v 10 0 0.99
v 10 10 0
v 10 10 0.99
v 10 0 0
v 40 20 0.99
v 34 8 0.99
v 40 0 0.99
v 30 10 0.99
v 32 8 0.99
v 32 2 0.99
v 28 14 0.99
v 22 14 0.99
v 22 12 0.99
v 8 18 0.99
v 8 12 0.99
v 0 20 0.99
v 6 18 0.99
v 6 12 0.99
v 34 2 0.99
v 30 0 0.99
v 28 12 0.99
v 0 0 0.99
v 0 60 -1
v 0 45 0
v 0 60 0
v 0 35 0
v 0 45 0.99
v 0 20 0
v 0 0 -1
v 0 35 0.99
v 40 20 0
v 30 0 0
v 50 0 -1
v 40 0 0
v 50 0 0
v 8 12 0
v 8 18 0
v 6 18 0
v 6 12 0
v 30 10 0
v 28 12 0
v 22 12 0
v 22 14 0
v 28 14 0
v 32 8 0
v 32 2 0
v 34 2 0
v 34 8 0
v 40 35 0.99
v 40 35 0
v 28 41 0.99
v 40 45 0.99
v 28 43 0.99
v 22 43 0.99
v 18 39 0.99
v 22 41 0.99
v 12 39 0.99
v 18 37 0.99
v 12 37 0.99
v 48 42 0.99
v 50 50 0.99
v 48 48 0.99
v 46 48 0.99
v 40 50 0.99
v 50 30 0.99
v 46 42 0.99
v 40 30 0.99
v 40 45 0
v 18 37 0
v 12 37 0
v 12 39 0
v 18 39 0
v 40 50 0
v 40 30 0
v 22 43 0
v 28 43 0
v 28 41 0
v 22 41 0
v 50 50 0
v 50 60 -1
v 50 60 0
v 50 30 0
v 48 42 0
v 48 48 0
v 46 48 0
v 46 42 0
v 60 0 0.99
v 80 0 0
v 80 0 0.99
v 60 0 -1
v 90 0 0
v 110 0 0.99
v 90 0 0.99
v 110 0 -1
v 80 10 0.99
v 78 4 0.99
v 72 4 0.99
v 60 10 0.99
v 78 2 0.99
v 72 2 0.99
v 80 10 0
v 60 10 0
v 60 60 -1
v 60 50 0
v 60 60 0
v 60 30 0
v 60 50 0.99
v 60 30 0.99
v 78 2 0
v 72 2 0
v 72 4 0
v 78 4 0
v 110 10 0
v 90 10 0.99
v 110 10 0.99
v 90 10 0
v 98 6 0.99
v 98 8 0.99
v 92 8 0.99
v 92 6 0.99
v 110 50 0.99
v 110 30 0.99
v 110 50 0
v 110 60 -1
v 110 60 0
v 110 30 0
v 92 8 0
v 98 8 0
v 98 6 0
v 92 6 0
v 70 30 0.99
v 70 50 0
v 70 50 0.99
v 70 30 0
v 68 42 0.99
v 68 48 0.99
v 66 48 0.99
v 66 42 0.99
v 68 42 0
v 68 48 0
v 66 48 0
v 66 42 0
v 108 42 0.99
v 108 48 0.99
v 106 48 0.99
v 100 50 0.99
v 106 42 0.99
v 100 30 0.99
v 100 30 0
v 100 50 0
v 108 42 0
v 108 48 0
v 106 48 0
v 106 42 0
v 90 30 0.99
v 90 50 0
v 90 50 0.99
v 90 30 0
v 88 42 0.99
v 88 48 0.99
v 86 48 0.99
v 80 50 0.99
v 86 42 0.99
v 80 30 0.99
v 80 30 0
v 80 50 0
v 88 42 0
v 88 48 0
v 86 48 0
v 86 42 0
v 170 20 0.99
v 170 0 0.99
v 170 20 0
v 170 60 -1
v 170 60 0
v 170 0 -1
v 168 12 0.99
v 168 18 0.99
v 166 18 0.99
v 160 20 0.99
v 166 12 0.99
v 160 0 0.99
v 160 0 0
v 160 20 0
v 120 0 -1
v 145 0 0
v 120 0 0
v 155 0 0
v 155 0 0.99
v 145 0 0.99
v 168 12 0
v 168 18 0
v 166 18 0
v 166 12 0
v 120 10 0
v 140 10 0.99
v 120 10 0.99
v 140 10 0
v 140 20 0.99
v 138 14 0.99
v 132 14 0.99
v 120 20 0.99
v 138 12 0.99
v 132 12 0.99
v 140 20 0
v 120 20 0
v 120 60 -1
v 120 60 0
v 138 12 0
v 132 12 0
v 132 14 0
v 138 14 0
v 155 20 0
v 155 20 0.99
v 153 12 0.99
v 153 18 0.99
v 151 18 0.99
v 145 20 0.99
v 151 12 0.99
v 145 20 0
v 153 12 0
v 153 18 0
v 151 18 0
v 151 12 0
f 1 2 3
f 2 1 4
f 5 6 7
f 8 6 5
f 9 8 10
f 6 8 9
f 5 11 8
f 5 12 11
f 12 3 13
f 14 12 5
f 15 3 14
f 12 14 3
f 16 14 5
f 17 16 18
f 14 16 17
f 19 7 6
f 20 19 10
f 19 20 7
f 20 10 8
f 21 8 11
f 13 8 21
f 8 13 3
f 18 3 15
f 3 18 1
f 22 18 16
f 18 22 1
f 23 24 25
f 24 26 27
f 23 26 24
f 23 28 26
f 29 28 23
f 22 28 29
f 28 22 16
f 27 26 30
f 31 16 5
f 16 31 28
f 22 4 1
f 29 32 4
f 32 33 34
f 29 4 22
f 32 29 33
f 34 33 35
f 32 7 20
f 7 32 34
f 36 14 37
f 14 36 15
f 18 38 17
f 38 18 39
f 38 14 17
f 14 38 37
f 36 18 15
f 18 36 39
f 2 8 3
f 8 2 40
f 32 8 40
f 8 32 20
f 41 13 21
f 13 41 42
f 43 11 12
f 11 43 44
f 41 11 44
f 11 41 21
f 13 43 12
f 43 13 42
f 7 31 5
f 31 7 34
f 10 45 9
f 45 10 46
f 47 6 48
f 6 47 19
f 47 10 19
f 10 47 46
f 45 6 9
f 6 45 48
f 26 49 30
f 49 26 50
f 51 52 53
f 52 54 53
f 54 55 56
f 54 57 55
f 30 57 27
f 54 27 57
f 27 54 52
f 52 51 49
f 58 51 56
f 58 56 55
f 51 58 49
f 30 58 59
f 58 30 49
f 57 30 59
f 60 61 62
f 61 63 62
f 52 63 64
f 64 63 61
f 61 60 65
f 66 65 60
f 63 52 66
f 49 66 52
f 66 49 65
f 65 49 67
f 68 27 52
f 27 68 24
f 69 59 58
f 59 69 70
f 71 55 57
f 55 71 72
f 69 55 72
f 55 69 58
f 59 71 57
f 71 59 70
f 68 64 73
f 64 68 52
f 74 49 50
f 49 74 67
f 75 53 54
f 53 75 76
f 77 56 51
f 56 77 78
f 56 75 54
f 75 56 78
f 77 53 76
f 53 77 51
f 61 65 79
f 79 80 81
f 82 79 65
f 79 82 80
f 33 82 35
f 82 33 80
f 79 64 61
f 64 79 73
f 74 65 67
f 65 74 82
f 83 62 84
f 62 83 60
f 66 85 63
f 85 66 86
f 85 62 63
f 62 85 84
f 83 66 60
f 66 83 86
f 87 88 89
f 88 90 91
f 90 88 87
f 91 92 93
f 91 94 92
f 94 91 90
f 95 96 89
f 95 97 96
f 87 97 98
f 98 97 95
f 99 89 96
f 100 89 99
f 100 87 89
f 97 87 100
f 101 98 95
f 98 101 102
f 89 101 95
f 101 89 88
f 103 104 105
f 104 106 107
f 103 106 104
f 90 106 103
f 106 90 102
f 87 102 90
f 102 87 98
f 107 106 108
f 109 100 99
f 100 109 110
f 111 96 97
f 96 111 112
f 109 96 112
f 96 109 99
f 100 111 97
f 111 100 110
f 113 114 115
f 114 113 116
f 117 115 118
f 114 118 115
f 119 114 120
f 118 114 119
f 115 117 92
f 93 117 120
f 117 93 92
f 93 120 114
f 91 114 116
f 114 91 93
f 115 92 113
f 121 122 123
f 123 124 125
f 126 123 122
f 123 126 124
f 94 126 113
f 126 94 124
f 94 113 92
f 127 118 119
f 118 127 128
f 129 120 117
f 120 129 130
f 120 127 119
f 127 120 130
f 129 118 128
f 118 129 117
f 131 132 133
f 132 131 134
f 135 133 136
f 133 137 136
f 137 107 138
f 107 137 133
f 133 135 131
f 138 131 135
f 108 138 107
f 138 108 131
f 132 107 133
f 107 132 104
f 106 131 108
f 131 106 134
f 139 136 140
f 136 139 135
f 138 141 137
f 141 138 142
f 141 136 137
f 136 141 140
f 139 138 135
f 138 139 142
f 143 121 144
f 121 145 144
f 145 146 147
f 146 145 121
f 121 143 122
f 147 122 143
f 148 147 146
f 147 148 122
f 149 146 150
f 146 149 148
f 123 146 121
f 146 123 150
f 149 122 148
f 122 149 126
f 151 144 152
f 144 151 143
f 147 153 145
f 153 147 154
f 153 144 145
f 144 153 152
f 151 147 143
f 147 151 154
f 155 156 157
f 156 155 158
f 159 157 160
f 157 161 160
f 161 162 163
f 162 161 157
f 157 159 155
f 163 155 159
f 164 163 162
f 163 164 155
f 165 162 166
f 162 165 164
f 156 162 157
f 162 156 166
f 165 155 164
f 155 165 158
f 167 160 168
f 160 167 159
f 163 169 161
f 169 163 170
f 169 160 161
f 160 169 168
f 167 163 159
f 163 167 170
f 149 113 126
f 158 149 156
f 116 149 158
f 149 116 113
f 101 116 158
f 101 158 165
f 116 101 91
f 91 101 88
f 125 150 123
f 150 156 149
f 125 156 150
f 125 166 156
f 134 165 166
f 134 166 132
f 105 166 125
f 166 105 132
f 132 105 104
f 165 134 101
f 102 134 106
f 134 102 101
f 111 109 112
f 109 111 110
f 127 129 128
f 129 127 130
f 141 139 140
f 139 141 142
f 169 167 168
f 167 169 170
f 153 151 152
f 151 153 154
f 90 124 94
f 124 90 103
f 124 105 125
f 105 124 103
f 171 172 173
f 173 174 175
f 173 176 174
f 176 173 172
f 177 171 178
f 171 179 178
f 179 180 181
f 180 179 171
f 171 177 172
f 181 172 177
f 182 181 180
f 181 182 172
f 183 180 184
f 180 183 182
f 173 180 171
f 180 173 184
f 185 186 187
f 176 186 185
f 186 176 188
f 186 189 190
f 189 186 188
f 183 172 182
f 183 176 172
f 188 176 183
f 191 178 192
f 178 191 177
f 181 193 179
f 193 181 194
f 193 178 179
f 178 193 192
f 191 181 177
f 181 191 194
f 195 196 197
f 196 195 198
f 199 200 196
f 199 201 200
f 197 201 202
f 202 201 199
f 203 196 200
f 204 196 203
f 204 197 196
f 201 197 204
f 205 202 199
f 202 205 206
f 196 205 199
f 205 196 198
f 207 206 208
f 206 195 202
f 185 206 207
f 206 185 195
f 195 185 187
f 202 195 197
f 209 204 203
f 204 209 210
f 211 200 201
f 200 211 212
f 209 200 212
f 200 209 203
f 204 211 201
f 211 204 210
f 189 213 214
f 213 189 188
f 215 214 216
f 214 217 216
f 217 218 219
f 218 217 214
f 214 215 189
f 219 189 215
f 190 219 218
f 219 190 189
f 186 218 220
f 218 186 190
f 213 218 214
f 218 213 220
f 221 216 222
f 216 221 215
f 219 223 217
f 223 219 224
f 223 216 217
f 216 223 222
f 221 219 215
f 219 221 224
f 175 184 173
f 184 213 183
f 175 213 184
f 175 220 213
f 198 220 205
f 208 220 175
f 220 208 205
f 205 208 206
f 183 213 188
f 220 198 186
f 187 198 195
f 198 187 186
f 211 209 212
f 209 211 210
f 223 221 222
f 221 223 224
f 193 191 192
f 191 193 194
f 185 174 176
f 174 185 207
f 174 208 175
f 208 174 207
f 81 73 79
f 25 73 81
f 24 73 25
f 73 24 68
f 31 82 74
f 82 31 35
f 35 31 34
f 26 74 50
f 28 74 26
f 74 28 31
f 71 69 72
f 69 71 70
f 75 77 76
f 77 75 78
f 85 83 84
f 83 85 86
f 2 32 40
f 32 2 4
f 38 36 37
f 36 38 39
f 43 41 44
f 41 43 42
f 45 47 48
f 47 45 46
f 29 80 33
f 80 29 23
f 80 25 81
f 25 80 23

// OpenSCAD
// file: ../../Base/Boxes.scad
// Fischertechnik Box Foundation
// Pre-designed Boxes

use <Constants.scad>

include <PlacementOptions.scad>

box190Width = 190;
box190Depth = 130;
box130Width = 130;
box130Depth = 95;

// Values are from an original ec3 box
topBottomDifference = 1.5;
outerHeight = 40;
innerHeight = 38.2;
baseThickness = outerHeight - innerHeight;
stackExcess = 5.7;
radius = 3.5;
wallThickness = 1.5;
tolerance = 0.2;
stackOffset = innerHeight - stackExcess;

boxUsageHeight = stackOffset;
boxWallThickness = wallThickness;
boxBaseThickness = baseThickness;
boxWebWidth = 3.0;

// getBoxWallThickness()
// Gets the wall thickness of a Fischertechnik Box
function getBoxWallThickness() = boxWallThickness;

// getBoxUsageHeight()
// Gets the usable height of a Fischertechnik box
function getBoxUsageHeight() = boxUsageHeight;

// getBoxInnerHeight()
// Gets the inner height of a Fischertechnik box, including the stack excess
function getBoxInnerHeight() = innerHeight;

// getBoxBaseThickness()
// Gets the thickness of the Fischertechnik box base.
function getBoxBaseThickness() = boxBaseThickness;

// getBoxWebWidth()
// Gets the width of a box web
function getBoxWebWidth() = boxWebWidth;

// getBox190Space()
// Gets the usable inner space of a Box 190 as an x/y-list
function getBox190Space() = [
    box190Width - 2*getBoxWallThickness() - topBottomDifference, 
    box190Depth - 2*getBoxWallThickness() - topBottomDifference ];

// BoxBase(width, depth)
// Creates an empty stackable Fischertechnik compatible box
// width = Outer width of the box (190, 130, ...)
// depth = Outer depth of the box (130, 95, ...)

module BoxBase(width, depth, height=outerHeight) {    
    thinPlate = 0.01;

    innerHeight = height - baseThickness;    
    
    module BodyPlate(width, depth) {
        translate([radius, radius])
        hull() {
            w = width-2*radius;
            d = depth-2*radius;
            cube([w, d, thinPlate]);
            cylinder(thinPlate, r=radius, $fn=getFragments());
            translate([w, 0])
                cylinder(thinPlate, r=radius, $fn=getFragments());
            translate([w, d])
                cylinder(thinPlate, r=radius, $fn=getFragments());
            translate([0, d])
                cylinder(thinPlate, r=radius, $fn=getFragments());
        }
    }
    
    module Body(tolerance=tolerance) {
        hull() {
            // Bottom with tolerance to fit into the original boxes when stacked
            translate([-wallThickness+tolerance, -wallThickness+tolerance, -baseThickness])
                BodyPlate(width-topBottomDifference-2*tolerance, depth-topBottomDifference-2*tolerance);
            
            // Top
            translate([-wallThickness-topBottomDifference/2, -wallThickness-topBottomDifference/2, innerHeight-thinPlate])
                BodyPlate(width, depth);
         }
    }

    module Cutoff() {
        hull() {
            coWidth = width - 2*wallThickness;
            coDepth = depth - 2*wallThickness;
            
            // Bottom
            BodyPlate(coWidth-topBottomDifference, coDepth-topBottomDifference);

            // Top
            translate([-topBottomDifference/2, -topBottomDifference/2, innerHeight+thinPlate]) 
                BodyPlate(coWidth, coDepth);
        }
    }
    
    difference() {        
        Body();
        Cutoff();
        stackOffset = innerHeight - stackExcess;
        translate([0, 0, stackOffset + baseThickness])
            Body(tolerance=0);
    }
}

// Creates the Fischertechnik empty box 130x190 mm and places it at position 0,0
// 190x130 are the outer sizes, the inner space is slightly smaller. Use getBox190Space() to get the inner sizes.
// The box is positioned that the usable inner space is at the 0,0,0 position. The

module Box190() {
    BoxBase(box190Width, box190Depth);
}

// Gets the usable inner space of a Box 130 as an x/y-list
function getBox130Space() = [
    box130Width - 2*getBoxWallThickness(), 
    box130Depth - 2*getBoxWallThickness() ];

// Creates the Fischertechnik empty box 95x130 mm and places it at position 0,0
// 190x130 are the outer sizes, the inner space is slightly smaller. Use getBox190Space() to get the inner sizes.
// The box is positioned that the usable inner space is at the 0,0,0 position. The

module Box130() {
    BoxBase(box130Width, box130Depth);
}

// Creates a web at the specified box walls
// corner 0 = LowerLeft, 1 = UpperLeft, 2 = UpperRight, 3 = LowerRight
// side 0 = LeftOfCorner, 1 = RightOfCorner
// distance = Distance in mm from the corner
// boxSpace = inner width and depth of the box (default: Box 190)
// webWidth = length of the web (default is 3 mms)
// webThickness = thickness of the web (default is 1 mm)

module BoxWeb(corner, side, distance, boxSpace=getBox190Space(), webWidth=getBoxWebWidth(), webThickness=1.0) {
    sink = getBoxWallThickness()/2;

    width = (corner % 2 == 0) ? 
            (side == LeftOfCorner ? webWidth : webThickness) :
            (side == LeftOfCorner ? webThickness : webWidth);

    depth = (corner % 2 == 0) ? 
            (side == RightOfCorner ? webWidth : webThickness) :
            (side == RightOfCorner ? webThickness : webWidth);
    
    xDiff = corner == LowerLeft ? 
                (side == LeftOfCorner ? -sink : distance) :
            (corner == UpperLeft ?                
                (side == LeftOfCorner ? distance : -sink) :
            (corner == UpperRight ?
                (side == LeftOfCorner ? boxSpace.x-webWidth+sink : boxSpace.x-distance-webThickness) :
                (side == LeftOfCorner ? boxSpace.x-distance-webThickness: boxSpace.x-webWidth+sink)));

    yDiff = corner == LowerLeft ? 
                (side == RightOfCorner ? -sink : distance) :
            (corner == UpperLeft ?
                (side == RightOfCorner ? boxSpace.y-distance : boxSpace.y-webWidth+sink) :
            (corner == UpperRight ?
                (side == RightOfCorner ? boxSpace.y-webWidth+sink : boxSpace.y-distance) :
                (side == RightOfCorner ? distance : -sink)));
    
    translate([xDiff, yDiff, -getExcess()])
        cube([width, depth, boxUsageHeight + 2*getExcess()]);
}
// file: ../../Base/Alignment.scad
// Fischertechnik Box Foundation
// Geometry Helpers Alignment

include <PlacementOptions.scad>

// getAlignedX(elementWidth, spaceWidth, align=AlignRight, offset=0)
// Gets the aligned X offset of an element with the given
// width in the given space.
// elementWidth = The width of the element to positon
// spaceWidth = The space where the element should be aligned
// align = 0 AlignLeft, 1 AlignCenter, 2 AlignRight
// offset = an optional offset from the aligned position. When
// aligned left or centered, then positive values are in X direction.
// When aligned right then positive values are in negative X direction.

function getAlignedX(elementWidth, spaceWidth, align=AlignRight, offset=0) =
    (align == AlignLeft) ?
        offset :
        ((align == AlignCenter) ?
        (spaceWidth - elementWidth)/2 + offset :
        spaceWidth - offset - elementWidth);

// getAlignedY(elementDepth, spaceDepth, align=AlignTop, offset=0)
// Gets the aligned Y offset of an element with the given
// depth in the given space.
// elementDepth = The depth of the element to positon
// spaceDepth = The space where the element should be aligned
// align = 0 AlignBottom, 1 AlignCenter, 2 AlignTop
// offset = an optional offset from the aligned position. When
// aligned bottom or centered, then positive values are in Y direction.
// When aligned top then positive values are in negative Y direction.

function getAlignedY(elementDepth, spaceDepth, align=AlignTop, offset=0) =
    (align == AlignBottom) ?
        offset :
        ((align == AlignCenter) ?
        (spaceDepth - elementDepth)/2 + offset :
        spaceDepth - offset - elementDepth);
// file: ../../Base/Rotation.scad
// Fischertechnik Box Foundation
// Geometry Helpers Rotation

include <PlacementOptions.scad>

// getRotatedSpace(space, rotation=NoRotation)
// Rotates the space dependent on the specified rotation

function getRotatedSpace(space, rotation=NoRotation) = [
    (rotation == Rotate90 || rotation == Rotate270) ? space.y : space.x,
    (rotation == Rotate90 || rotation == Rotate270) ? space.x : space.y
];

// Rotates the given space around the fixed left lower corner
// space = the space the children needs as width/depth list [width,depth]
// rotation = 0 Rotate0 degrees, 1 Rotate90 degrees, 2 Rotate180 degrees, 3 Rotate270 degrees (equivalent to -90)

module RotateFix(space, rotation=NoRotation) {
    dy = (rotation == Rotate0 || rotation == Rotate270) ? 0 :
        (rotation == Rotate90) ? space.x :
        space.y;
    dx = (rotation < Rotate180) ? 0 :
        (rotation == Rotate180) ? space.x :
        space.y;
    
    translate([dx, dy, 0])
        rotate([0, 0, rotations[rotation]])
            children();
}
// file: ../../Base/Helper.scad
// Fischertechnik Box Foundation
// Helper functions

include <PlacementOptions.scad>

// getRotation(rotations, i)
// gets the rotation with index i, even if rotations or rotations[i] is undefined.
// If undefined, NoRotation ist returned.
// rotations = list of Rotate-constants
// i = Index of the rotation
function getRotation(rotations, i) = (is_undef(rotations) || is_undef(rotations[i])) ? NoRotation : rotations[i];
// file: ../../Base/Constants.scad
// Fischertechnik Box Foundation
// Constants

// Constant values necessary for multiple elements

// Base constants
dividerThickness = 1.2;
excess = 0.01;
fragments = 90;
tolerance = 0.8;

// Gets the thickness of a divider 
function getDividerThickness() = dividerThickness;

// Gets the excess that is used to merge walls into each other
function getExcess() = excess;

// Gets amount of fragments of a cylinder
function getFragments() = fragments;

// Gets the inner tolerance of a frame to each side
function getTolerance() = tolerance;


// Fischertechnik specific constants
axisDiameter = 4;
axisBottomDiameter = axisDiameter + 1;
standardEdgeDistance = 2.5;
standardWebDistance = 11.5;
standardCornerLength = 15;
tubeWallFactor = 0.8;
smallPartsFrameHeight = 20;

// Gets axis diameter
function getAxisDiameter() = axisDiameter;

// Gets axis bottom diameter for thicker part at the bottom
function getAxisBottomDiameter() = axisBottomDiameter;

// gets the standard distance to the wall of the box for dockable frames with webs
function getStandardEdgeDistance() = standardEdgeDistance;

// gets the standard distance of each web to the corner of the dockable frame
function getStandardWebDistance() = standardWebDistance;

// gets the standard length of the corner walls of a dockable frame
function getStandardCornerLength() = standardCornerLength;

// gets the wall thickness of a tube.
function getTubeWallThickness() = tubeWallFactor * getDividerThickness();

// gets the frame height for docked small parts boxes.
function getSmallPartsFrameHeight() = smallPartsFrameHeight;
// file: ../TestHelper.scad
// Fischertechnik Box Foundation
// Test Helper

function getPlacementBaseSpace() = [50,60];
function getCubeSpace() = [10,20];

module PlacementBase() {
    color("green")
    translate([0, 0, -1])
        cube([getPlacementBaseSpace().x, getPlacementBaseSpace().y, 1]);
}

module Cube() {
    translate([0,0,-.01])
    difference() {
        cube([getCubeSpace().x,getCubeSpace().y,1]);
        translate([getCubeSpace().x*0.6, getCubeSpace().y*0.6, -1])
            cube([getCubeSpace().x*0.2,getCubeSpace().y*0.3,3]);
    }
}

module Deploy(distance=30) {
    for( i = [0:1:$children-1])
        translate([i*distance, 0])
            children(i);
}
// file: ../../Base/PlacementOptions.scad
// Fischertechnik Box Foundation
// Placement Options

// Alignment
NoAlign = 0;
AlignLeft = 1;
AlignBottom = 2;
AlignCenter = 3;
AlignRight = 4;
AlignTop = 5;

// Element rotation degree steps
rotations = [0, -90, -180, -270];

// Rotation
NoRotation = 0;
Rotate0 = 0;
Rotate90 = 1;
Rotate180 = 2;
Rotate270 = 3;

// Docking (seen from above)
NoDock = -1;
DockLeft = 0;
DockTop = 1;
DockRight = 2;
DockCorner = 2;
DockBottom = 3;

// Web corners
LowerLeft = 0;
UpperLeft = 1;
UpperRight = 2;
LowerRight = 3;

// Web position relative to corner
LeftOfCorner = 0;
RightOfCorner = 1;
// file: ../../Base/Placement.scad
// Fischertechnik Box Foundation
// Geometry Helpers Placement

use <Constants.scad>
use <Alignment.scad>
use <Rotation.scad>
use <Boxes.scad>

include <PlacementOptions.scad>

// Place(x=0, y=0, elementSpace=[0,0], alignX=AlignLeft, alignY=AlignBottom, rotation=Rotate0, boxSpace=getBox190Space())
// Places the child at the specified position
// y = Y-Position. This is a relative position when an X aligment is specified.
// x = X-Position. This is a relative position when an Y aligment is specified.
// elementSpace = space of the element to be placed [x,y]
// alignX = -1=NoAlign, 0 AlignLeft, 1 AlignCenter, 3 AlignRight (elementSpace and boxSpace required!)
// alignY = -1=NoAlign, 2 AlignBottom, 1 AlignCenter, 4 AlignTop (elementSpace and boxSpace required!)
// rotation = 0 Rotate0 0 degrees, 1 Rotate90 90 degrees, 
// 2 Rotate180 180 degrees, 3 Rotate270 270 degrees (equivalent to -90)
// boxSpace = Inner space of the box where the placement occurs [x,y] - default is Box 190x130 inner space

module Place(x=0, y=0, elementSpace=[0,0], 
  alignX=AlignLeft, alignY=AlignBottom, 
  rotation=NoRotation, boxSpace=getBox190Space()) {

    module Position(x, y, space, rotation=Rotate0) {
        translate([x, y, 0])
            RotateFix(space, rotation)
                children();
    }

    space = getRotatedSpace(elementSpace, rotation);
    alignedX = getAlignedX(space.x, boxSpace.x, alignX, x);
    alignedY = getAlignedY(space.y, boxSpace.y, alignY, y);
    Position(alignedX, alignedY, elementSpace, rotation)
        children();
}

// Center(space=getBox130Space(), elementSpace=[0,0])
// space = Space where the children is centered. For cylinder use centered=true and no elementSpace.
// elementSpace = space of the element to be centered [x,y]

module Center(space=getBox190Space(), elementSpace=[0,0]) {
    Place(elementSpace=elementSpace, boxSpace=space, alignX=AlignCenter, alignY=AlignCenter)
        children();
}

// CenterHorizontal(width=0, y=0, offset=0, space=getBox130Space())
// width = Width of the element to be placed.
// y = Y position of the element
// offset = Offset from the center position (negative will be left of the center)
// space = Space where the element is placed

module CenterHorizontal(width=0, y=0, offset=0, space=getBox190Space()) {
    Place(x=offset, y=y, elementSpace=[width, 0], boxSpace=space, alignX=AlignCenter)
        children(0);
}

// CenterVertical(depth=0, x=0, offset=0, space=getBox130Space())
// depth = Depth of the element to be placed.
// x = X position of the element
// offset = Offset from the center position (negative will be down of the center)
// space = Space where the element is placed

module CenterVertical(depth=0, x=0, offset=0, space=getBox190Space()) {
    Place(x=x, y=offset, elementSpace=[0, depth], boxSpace=space, alignY=AlignCenter)
        children(0);
}

// getIsVertical(align)
// True if the specified alignment needs a vertical orientation for a divider (AlignRight, AlignLeft)

function getIsVertical(align) = (align == AlignRight || align == AlignLeft);

// getIsHorizontal(align)
// True if the specified alignment needs a horizontal orientation for a divider (AlignTop, AlignBottom)

function getIsHorizontal(align) = (align == AlignTop || align == AlignBottom);
// main file
// Fischertechnik Box Foundation
// Geometry Helpers Deployment
// Test DeployHorizontal

use <../../Base/Deployment.scad>
use <../../Base/Placement.scad>

include <../../Base/PlacementOptions.scad>

use <../TestHelper.scad>

PlacementBase();

DeployHorizontal(
    0, 
    [getCubeSpace(), getCubeSpace(), getCubeSpace()],
    [NoRotation, Rotate90, Rotate180],
    alignY=AlignTop) {
    Cube();
    Cube();
    Cube();
}

translate([0, 30, 0])
DeployHorizontal(
    getPlacementBaseSpace().x, 
    [getCubeSpace(), getCubeSpace(), getCubeSpace()],
    [Rotate90, Rotate270, Rotate0],
    alignY=AlignCenter) {
    Cube();
    Cube();
    Cube();
}

translate([60,0]) {
    PlacementBase();
    
    DeployHorizontal(
        getPlacementBaseSpace().x, 
        [getCubeSpace(), getCubeSpace()],
        [Rotate90, Rotate270],
        alignY=AlignTop) {
        Cube();
        Cube();
        }   

    // Default rotation (NoRotation)
    translate([0,30])
    DeployHorizontal(
        getPlacementBaseSpace().x, 
        [getCubeSpace(), getCubeSpace(), getCubeSpace()],
        alignY=AlignTop) {
        Cube();
        Cube();
        Cube();
        }   
}

translate([120,0]) {
    PlacementBase();
    
    // Default rotation for second and third (NoRotation)
    DeployHorizontal(
        getPlacementBaseSpace().x, 
        [getCubeSpace(), getCubeSpace(), getCubeSpace()],
        [Rotate90],
        alignY=AlignTop) {
        Cube();
        Cube();
        Cube();
        }   
}
